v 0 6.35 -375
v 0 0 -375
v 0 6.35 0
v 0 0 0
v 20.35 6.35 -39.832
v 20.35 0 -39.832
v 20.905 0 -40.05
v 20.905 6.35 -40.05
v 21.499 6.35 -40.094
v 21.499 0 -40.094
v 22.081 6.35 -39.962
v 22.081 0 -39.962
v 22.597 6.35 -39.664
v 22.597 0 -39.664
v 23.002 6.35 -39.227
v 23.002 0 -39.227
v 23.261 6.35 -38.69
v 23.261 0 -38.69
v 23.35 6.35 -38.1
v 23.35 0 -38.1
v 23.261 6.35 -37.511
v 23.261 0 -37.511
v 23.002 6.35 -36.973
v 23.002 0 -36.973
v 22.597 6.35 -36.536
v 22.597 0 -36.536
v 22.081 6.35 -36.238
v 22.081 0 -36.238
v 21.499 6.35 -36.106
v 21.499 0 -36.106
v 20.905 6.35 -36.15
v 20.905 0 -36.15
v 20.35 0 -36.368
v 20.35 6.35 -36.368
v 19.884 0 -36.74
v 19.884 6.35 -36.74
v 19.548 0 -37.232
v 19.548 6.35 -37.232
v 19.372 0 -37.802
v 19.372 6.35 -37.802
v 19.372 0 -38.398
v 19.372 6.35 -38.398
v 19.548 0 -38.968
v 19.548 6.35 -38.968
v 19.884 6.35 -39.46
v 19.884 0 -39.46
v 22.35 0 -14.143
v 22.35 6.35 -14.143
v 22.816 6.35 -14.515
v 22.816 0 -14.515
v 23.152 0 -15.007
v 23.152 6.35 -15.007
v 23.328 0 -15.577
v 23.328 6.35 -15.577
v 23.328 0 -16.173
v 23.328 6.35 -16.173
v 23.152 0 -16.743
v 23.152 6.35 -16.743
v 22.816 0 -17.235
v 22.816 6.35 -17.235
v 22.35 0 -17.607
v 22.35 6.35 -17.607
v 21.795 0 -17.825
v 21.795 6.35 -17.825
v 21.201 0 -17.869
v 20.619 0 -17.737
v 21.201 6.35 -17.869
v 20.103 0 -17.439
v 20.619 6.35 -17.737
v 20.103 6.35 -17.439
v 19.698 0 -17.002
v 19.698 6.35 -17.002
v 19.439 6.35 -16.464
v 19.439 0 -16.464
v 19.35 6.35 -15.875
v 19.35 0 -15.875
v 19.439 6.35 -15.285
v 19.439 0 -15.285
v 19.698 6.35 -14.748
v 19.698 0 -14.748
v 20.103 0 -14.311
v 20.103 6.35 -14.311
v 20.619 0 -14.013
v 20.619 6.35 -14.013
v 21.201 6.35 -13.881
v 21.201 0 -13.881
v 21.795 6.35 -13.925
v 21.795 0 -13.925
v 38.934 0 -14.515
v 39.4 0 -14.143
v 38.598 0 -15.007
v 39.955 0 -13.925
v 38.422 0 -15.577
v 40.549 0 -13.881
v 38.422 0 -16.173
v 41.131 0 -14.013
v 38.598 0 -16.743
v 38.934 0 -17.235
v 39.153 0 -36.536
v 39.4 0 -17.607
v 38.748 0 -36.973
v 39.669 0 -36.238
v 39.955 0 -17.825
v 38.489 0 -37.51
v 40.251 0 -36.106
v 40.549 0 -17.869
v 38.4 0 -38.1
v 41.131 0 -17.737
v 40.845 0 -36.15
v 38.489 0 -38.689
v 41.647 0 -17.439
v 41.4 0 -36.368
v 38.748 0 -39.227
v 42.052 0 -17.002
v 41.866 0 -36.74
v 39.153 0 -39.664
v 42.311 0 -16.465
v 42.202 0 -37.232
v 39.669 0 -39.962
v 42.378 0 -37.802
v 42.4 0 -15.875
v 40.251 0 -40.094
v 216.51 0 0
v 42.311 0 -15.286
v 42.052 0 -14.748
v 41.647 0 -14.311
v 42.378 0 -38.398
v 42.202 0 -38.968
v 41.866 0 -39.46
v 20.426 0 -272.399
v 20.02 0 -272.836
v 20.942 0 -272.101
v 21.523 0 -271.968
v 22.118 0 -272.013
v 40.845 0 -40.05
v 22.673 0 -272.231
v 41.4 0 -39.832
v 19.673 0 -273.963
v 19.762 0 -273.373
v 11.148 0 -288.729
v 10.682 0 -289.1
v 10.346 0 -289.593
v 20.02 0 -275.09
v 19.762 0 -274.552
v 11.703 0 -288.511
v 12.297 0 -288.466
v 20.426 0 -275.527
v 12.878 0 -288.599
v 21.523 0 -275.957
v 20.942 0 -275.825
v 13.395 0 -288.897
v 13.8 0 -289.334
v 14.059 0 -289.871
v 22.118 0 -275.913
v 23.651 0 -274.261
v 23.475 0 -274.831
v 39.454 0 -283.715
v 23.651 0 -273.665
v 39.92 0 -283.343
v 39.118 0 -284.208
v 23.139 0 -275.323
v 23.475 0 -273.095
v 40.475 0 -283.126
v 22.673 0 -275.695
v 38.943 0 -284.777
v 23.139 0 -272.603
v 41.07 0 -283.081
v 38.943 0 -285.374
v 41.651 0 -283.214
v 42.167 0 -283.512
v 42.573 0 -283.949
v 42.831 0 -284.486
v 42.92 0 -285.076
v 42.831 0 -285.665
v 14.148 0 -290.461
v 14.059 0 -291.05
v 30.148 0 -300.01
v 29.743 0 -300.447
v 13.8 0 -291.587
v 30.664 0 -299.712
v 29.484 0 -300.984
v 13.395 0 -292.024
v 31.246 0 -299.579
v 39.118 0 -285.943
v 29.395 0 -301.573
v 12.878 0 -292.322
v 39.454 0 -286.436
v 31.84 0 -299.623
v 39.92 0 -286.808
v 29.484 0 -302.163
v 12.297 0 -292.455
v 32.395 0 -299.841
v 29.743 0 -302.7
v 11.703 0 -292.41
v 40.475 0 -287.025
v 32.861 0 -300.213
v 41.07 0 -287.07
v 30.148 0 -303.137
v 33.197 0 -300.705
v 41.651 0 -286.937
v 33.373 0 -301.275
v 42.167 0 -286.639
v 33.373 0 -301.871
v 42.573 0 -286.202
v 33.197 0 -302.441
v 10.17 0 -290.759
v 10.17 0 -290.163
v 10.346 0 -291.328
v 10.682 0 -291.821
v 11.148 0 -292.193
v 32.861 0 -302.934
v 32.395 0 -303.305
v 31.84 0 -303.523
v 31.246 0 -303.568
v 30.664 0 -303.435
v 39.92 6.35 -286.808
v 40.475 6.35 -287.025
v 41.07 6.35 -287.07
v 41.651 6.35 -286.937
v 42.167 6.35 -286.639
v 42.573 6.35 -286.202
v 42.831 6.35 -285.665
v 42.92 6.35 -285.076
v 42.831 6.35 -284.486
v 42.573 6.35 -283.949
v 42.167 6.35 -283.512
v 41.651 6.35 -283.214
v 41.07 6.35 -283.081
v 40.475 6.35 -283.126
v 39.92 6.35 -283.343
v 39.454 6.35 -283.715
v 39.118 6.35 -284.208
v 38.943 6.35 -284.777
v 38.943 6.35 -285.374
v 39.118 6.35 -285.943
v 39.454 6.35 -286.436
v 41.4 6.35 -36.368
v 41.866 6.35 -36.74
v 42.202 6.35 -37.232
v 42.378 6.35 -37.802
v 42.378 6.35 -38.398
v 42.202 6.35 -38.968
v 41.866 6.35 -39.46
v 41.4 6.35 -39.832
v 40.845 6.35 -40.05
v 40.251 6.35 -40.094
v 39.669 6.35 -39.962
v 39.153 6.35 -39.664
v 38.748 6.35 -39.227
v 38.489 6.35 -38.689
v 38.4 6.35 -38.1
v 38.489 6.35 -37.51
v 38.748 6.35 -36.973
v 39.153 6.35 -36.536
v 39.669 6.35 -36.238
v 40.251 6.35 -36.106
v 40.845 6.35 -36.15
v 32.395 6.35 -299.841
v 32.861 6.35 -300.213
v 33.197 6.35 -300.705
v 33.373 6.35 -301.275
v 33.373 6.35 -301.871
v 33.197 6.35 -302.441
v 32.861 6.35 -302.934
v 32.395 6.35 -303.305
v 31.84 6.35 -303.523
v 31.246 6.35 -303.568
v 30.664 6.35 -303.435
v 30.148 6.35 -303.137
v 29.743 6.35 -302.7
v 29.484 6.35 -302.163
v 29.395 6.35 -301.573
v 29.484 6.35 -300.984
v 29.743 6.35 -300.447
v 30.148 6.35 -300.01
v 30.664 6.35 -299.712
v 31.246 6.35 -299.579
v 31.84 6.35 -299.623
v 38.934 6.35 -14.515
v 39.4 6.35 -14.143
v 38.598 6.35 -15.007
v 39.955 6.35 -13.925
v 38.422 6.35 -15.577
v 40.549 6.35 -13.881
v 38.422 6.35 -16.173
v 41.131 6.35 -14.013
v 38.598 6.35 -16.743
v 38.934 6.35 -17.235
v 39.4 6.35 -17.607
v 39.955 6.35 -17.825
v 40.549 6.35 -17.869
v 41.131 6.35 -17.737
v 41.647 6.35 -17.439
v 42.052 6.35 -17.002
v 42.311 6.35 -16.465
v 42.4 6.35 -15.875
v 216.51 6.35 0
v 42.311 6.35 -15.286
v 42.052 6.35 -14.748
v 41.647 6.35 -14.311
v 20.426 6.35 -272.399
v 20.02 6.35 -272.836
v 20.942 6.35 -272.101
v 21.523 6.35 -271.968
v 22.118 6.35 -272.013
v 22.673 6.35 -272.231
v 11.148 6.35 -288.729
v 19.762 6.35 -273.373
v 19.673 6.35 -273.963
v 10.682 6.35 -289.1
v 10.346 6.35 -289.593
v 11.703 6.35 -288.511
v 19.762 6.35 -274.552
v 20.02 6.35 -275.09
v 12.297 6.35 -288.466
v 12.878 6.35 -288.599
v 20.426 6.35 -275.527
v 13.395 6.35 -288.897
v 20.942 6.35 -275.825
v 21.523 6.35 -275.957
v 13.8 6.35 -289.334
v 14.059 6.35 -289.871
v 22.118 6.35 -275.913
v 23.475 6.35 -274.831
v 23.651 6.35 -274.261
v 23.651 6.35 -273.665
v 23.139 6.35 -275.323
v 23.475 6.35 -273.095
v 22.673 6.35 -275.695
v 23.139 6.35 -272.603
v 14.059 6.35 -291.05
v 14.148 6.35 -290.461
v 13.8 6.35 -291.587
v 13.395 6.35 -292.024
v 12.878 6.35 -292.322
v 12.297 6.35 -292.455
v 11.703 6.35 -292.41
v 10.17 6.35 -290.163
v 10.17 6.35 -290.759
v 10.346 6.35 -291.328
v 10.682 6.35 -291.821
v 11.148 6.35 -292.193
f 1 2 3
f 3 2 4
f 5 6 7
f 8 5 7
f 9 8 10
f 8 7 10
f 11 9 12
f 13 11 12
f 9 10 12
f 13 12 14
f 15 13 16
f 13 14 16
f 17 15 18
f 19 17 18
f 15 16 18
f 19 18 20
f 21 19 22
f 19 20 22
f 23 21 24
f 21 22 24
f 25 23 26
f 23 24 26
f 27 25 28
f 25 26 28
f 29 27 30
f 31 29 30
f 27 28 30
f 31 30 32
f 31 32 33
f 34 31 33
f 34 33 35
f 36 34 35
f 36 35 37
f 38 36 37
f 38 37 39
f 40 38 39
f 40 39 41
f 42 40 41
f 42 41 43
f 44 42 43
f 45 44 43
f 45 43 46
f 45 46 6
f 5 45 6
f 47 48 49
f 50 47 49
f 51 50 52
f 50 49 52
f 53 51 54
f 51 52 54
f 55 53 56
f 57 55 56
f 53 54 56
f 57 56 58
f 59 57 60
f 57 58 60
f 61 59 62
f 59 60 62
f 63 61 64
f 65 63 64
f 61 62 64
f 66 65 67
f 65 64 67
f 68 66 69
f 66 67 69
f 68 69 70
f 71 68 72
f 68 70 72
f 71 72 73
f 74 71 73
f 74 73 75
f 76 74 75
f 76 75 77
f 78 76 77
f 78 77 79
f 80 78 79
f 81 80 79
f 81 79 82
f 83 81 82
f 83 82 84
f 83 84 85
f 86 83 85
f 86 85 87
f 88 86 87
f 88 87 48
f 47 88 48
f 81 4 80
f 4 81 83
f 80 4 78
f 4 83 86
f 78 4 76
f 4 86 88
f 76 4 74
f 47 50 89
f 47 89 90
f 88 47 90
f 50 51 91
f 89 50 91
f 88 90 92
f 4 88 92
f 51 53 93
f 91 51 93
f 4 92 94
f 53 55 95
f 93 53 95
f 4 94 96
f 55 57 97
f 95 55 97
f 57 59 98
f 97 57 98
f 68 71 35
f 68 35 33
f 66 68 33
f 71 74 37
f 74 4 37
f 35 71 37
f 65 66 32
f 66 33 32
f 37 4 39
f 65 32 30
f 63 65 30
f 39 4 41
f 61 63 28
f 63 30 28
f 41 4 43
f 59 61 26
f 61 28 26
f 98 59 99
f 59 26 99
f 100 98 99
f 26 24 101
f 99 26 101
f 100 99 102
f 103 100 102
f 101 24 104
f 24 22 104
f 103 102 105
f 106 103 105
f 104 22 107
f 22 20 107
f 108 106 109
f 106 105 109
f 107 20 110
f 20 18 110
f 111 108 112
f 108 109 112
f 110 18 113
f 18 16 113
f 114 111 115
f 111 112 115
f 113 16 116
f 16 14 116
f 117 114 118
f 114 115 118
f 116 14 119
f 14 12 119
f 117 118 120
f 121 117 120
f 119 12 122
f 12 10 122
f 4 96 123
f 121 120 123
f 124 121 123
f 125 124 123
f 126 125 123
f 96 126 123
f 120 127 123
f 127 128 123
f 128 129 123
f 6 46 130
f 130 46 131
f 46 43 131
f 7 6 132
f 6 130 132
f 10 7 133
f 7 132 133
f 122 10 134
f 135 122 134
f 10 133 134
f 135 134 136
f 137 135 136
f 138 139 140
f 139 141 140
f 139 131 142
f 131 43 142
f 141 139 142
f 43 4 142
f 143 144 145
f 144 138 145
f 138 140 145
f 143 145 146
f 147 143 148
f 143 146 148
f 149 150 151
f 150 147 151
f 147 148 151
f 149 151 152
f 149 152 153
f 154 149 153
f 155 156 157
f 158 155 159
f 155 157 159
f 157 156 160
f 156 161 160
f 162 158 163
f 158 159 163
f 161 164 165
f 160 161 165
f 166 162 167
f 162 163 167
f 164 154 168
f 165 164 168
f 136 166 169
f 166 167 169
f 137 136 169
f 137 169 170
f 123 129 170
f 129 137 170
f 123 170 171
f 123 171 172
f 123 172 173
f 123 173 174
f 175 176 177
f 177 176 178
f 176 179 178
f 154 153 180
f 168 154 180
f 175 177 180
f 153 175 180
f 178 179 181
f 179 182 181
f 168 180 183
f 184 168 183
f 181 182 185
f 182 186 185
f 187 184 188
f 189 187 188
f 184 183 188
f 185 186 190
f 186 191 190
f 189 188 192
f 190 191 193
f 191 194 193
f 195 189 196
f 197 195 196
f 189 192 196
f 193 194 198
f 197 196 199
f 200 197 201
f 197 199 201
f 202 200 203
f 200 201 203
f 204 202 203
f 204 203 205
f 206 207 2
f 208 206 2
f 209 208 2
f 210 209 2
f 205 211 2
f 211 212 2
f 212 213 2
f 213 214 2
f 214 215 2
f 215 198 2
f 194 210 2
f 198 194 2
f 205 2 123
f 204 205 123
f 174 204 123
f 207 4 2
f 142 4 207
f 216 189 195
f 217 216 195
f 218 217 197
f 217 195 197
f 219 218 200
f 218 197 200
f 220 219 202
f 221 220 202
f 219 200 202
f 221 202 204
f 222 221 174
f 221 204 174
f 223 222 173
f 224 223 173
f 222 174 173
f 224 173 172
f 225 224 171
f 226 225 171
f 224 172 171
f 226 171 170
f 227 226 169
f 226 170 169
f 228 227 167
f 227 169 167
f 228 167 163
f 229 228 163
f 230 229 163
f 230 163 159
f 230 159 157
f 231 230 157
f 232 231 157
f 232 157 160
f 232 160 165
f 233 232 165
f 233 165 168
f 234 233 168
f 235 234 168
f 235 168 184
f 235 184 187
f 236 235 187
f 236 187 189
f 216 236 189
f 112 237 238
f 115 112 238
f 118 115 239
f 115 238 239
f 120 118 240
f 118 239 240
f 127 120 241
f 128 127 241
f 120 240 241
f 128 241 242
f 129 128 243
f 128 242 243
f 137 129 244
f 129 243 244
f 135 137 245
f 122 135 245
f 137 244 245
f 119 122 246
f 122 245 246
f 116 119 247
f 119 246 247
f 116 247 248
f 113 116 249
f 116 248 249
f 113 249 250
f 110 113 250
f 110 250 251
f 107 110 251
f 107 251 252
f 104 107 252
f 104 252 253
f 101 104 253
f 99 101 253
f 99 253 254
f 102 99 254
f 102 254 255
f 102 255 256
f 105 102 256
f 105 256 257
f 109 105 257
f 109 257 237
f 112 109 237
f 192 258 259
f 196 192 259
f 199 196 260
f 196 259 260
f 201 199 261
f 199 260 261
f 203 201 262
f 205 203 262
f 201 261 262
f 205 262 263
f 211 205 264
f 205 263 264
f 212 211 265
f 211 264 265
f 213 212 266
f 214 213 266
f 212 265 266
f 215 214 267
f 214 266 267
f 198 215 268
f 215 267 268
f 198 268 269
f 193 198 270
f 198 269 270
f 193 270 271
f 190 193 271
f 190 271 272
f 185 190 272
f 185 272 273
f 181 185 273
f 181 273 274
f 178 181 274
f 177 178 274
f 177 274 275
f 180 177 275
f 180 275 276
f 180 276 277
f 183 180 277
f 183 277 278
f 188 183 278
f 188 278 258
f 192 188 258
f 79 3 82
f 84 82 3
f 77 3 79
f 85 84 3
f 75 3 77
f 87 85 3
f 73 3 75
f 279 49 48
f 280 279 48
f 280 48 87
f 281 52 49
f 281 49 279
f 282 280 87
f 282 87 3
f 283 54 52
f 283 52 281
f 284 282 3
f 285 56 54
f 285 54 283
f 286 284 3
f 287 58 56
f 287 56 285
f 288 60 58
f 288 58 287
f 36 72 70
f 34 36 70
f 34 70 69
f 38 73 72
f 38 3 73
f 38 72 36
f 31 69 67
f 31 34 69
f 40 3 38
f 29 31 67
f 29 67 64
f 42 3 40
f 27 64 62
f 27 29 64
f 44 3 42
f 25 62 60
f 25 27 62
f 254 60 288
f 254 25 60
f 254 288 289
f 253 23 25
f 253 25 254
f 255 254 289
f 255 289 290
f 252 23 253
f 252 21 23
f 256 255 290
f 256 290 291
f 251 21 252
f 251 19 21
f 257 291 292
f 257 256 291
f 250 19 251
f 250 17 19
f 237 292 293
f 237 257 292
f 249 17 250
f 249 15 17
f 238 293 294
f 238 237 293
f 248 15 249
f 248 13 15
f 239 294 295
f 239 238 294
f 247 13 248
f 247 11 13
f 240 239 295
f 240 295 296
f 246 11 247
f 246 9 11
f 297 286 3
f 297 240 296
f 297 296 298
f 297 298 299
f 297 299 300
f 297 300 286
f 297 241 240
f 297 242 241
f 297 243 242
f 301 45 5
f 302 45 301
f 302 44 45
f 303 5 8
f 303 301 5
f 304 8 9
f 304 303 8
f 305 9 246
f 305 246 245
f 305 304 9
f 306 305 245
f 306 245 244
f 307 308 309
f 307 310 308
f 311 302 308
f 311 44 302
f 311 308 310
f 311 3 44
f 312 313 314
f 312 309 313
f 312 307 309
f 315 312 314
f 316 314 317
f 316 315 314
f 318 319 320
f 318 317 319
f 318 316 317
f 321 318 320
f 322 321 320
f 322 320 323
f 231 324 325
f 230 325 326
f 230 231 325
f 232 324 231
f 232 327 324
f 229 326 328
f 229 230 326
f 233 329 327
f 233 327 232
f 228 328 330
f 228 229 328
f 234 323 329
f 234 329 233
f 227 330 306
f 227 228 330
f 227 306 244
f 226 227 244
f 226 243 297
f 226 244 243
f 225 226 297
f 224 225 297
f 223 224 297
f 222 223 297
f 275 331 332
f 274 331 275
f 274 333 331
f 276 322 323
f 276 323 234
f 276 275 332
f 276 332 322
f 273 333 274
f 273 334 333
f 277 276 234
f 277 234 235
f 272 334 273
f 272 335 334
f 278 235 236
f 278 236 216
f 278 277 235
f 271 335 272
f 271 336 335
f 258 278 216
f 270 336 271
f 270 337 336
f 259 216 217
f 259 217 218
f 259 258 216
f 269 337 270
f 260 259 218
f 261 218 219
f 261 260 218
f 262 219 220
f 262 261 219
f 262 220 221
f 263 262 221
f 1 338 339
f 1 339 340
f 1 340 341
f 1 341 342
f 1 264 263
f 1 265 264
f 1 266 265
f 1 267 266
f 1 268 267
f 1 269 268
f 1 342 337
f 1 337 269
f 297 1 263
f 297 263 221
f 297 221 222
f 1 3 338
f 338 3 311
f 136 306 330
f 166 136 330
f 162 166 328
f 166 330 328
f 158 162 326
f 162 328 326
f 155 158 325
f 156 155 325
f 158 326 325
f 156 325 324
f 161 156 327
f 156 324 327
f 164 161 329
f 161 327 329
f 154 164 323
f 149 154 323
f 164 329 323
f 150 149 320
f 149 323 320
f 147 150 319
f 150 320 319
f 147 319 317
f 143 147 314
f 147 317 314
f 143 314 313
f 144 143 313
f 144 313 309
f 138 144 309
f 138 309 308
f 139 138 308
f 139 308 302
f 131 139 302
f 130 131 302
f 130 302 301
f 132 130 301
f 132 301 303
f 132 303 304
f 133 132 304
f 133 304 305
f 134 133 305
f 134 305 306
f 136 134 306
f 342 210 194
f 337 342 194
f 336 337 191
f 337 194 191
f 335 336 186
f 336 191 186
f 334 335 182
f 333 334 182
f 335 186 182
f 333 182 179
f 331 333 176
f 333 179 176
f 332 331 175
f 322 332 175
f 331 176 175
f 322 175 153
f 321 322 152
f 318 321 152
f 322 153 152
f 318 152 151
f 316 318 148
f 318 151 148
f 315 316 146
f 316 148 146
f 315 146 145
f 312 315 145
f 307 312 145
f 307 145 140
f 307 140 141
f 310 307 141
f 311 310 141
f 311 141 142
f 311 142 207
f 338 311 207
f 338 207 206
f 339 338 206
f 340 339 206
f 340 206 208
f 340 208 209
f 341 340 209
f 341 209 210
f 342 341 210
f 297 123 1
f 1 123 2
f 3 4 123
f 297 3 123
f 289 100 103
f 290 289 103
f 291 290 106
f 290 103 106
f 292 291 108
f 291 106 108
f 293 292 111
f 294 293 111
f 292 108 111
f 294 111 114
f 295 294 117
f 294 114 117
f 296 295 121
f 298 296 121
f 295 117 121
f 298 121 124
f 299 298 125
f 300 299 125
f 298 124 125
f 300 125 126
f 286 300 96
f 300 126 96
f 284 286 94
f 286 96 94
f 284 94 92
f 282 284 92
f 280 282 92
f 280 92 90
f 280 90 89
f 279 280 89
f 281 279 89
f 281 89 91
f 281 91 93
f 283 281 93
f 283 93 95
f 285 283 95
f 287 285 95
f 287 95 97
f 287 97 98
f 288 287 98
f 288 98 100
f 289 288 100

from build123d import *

# Parameters (mm, degrees)
BOSS_EXTRUDE1_DEPTH          = 6.35
F_4_0_4_DIAMETER_HOLE1_D     = 4
F_4_0_4_DIAMETER_HOLE1_DEPTH = 10
F_4_0_4_DIAMETER_HOLE1_TIP   = 1.201721238
F_4_0_4_DIAMETER_HOLE2_D     = 4
F_4_0_4_DIAMETER_HOLE2_DEPTH = 10
F_4_0_4_DIAMETER_HOLE2_TIP   = 1.201721238


with BuildPart() as part:
    # Sketch1 → Boss-Extrude1 (new body)
    with BuildSketch(Plane(origin=(0, 0, 0), x_dir=(1, 0, 0), z_dir=(0, 1, 0))):
        Polygon((0, 0), (216.51, 0), (0, 375), align=None)
    extrude(amount=BOSS_EXTRUDE1_DEPTH)

    # Ø4.0 (4) Diameter Hole1
    with Locations(Plane(origin=(31.757248956, 6.35, -326.345678088), x_dir=(0.50000632, 0, 0.866021755), z_dir=(0, 1, 0))):
        with Locations((21.272379971, -34.925), (40.322379971, -12.7), (244.423337674, -153.137564848), (273.195791575, -147.752490889)):
            Hole(F_4_0_4_DIAMETER_HOLE1_D / 2, depth=F_4_0_4_DIAMETER_HOLE1_DEPTH)
            with Locations((0, 0, -(F_4_0_4_DIAMETER_HOLE1_DEPTH + F_4_0_4_DIAMETER_HOLE1_TIP / 2))):  # 118° drill point
                Cone(0, F_4_0_4_DIAMETER_HOLE1_D / 2, F_4_0_4_DIAMETER_HOLE1_TIP, mode=Mode.SUBTRACT)

    # Ø4.0 (4) Diameter Hole2
    with Locations(Plane(origin=(31.757248956, 0, -326.345678088), x_dir=(-0.50000632, 0, -0.866021755), z_dir=(0, -1, 0))):
        with Locations((-21.272379971, -12.7), (-40.322379971, -34.925), (-253.948458076, -136.639850421), (-263.670671173, -164.250205317)):
            Hole(F_4_0_4_DIAMETER_HOLE2_D / 2, depth=F_4_0_4_DIAMETER_HOLE2_DEPTH)
            with Locations((0, 0, -(F_4_0_4_DIAMETER_HOLE2_DEPTH + F_4_0_4_DIAMETER_HOLE2_TIP / 2))):  # 118° drill point
                Cone(0, F_4_0_4_DIAMETER_HOLE2_D / 2, F_4_0_4_DIAMETER_HOLE2_TIP, mode=Mode.SUBTRACT)


solid = part.part
